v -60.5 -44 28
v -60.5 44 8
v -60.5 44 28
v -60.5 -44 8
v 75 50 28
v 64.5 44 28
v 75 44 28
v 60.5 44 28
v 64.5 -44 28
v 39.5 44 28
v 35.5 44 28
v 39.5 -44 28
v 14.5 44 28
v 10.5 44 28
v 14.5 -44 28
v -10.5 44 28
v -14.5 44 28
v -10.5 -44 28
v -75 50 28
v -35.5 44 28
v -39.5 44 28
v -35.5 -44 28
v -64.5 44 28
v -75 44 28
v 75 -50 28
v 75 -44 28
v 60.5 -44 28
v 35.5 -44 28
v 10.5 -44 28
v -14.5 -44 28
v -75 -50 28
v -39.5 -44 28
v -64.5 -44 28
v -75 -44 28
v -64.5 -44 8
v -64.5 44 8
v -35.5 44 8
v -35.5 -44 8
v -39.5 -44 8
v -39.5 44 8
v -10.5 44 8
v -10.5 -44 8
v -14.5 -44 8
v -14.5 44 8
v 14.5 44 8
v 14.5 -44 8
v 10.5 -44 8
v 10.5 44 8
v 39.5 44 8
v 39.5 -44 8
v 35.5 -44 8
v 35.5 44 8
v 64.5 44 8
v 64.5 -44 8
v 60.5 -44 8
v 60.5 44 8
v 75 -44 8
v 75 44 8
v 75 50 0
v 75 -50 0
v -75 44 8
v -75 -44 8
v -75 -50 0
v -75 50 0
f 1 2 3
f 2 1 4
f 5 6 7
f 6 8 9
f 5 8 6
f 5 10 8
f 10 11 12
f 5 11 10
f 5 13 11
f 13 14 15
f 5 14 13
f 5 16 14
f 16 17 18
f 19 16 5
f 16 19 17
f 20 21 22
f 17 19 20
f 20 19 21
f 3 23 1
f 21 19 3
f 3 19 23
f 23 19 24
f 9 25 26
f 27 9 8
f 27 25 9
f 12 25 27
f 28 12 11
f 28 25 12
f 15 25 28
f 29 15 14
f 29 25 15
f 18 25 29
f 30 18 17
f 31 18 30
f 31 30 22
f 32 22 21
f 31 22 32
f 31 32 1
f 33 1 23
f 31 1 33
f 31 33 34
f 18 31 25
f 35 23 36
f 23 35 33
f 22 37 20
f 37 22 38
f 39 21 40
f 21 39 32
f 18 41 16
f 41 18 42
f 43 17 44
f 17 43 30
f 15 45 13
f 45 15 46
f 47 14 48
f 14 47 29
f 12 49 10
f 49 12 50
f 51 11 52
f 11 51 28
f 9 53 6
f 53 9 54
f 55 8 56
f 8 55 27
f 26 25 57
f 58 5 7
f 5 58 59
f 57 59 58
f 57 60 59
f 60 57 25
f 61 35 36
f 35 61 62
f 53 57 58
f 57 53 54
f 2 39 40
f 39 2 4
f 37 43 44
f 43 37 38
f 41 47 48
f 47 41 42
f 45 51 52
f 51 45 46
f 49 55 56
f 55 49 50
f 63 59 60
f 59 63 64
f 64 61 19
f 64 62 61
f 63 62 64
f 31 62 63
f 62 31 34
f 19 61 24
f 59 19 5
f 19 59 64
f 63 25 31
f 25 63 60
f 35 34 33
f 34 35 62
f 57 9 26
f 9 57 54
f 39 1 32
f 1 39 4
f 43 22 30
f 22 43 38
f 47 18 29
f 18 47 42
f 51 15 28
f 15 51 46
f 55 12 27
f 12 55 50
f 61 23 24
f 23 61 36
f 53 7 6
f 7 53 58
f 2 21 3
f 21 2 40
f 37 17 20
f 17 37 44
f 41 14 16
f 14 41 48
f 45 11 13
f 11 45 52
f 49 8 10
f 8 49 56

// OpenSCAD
$fn = 32;

// ----------------------------------------------------------------------
// Rib frame 150 x 100 x 28
// 6 ribs at 25 mm pitch
// ----------------------------------------------------------------------

// --- parameters (mm) ---
frame = [150, 100, 8];  // base plate size (x, y, z)
rail_w = 6;             // side rail width
ribs = 6;               // number of ribs
rib_t = 4;              // rib thickness
rib_h = 20;             // rib height above the base plate
pitch = 25;             // pitch between rib centres

// --- derived feature positions (mm) ---
span = (ribs - 1) * pitch;          // = 125   distance between the outer ribs
origin_x = -span / 2;               // = -62.5   X of the first rib
rib_len = frame[1] - 2 * rail_w + 2;  // = 90   rib length, 1 mm into each rail
feature_centers = [
  [origin_x + 0 * pitch, 0],
  [origin_x + 1 * pitch, 0],
  [origin_x + 2 * pitch, 0],
  [origin_x + 3 * pitch, 0],
  [origin_x + 4 * pitch, 0],
  [origin_x + 5 * pitch, 0]
];   // rib centre line, drives the rib loop

// base plate, two side rails, then the ribs read straight off feature_centers
union() {
  translate([-frame[0] / 2, -frame[1] / 2, 0]) cube(frame);
  translate([-frame[0] / 2, -frame[1] / 2, 0]) cube([frame[0], rail_w, frame[2] + rib_h]);
  translate([-frame[0] / 2, frame[1] / 2 - rail_w, 0]) cube([frame[0], rail_w, frame[2] + rib_h]);
  for (centre = feature_centers)
    translate([centre[0] - rib_t / 2, centre[1] - rib_len / 2, frame[2] - 1])
      cube([rib_t, rib_len, rib_h + 1]);
}
